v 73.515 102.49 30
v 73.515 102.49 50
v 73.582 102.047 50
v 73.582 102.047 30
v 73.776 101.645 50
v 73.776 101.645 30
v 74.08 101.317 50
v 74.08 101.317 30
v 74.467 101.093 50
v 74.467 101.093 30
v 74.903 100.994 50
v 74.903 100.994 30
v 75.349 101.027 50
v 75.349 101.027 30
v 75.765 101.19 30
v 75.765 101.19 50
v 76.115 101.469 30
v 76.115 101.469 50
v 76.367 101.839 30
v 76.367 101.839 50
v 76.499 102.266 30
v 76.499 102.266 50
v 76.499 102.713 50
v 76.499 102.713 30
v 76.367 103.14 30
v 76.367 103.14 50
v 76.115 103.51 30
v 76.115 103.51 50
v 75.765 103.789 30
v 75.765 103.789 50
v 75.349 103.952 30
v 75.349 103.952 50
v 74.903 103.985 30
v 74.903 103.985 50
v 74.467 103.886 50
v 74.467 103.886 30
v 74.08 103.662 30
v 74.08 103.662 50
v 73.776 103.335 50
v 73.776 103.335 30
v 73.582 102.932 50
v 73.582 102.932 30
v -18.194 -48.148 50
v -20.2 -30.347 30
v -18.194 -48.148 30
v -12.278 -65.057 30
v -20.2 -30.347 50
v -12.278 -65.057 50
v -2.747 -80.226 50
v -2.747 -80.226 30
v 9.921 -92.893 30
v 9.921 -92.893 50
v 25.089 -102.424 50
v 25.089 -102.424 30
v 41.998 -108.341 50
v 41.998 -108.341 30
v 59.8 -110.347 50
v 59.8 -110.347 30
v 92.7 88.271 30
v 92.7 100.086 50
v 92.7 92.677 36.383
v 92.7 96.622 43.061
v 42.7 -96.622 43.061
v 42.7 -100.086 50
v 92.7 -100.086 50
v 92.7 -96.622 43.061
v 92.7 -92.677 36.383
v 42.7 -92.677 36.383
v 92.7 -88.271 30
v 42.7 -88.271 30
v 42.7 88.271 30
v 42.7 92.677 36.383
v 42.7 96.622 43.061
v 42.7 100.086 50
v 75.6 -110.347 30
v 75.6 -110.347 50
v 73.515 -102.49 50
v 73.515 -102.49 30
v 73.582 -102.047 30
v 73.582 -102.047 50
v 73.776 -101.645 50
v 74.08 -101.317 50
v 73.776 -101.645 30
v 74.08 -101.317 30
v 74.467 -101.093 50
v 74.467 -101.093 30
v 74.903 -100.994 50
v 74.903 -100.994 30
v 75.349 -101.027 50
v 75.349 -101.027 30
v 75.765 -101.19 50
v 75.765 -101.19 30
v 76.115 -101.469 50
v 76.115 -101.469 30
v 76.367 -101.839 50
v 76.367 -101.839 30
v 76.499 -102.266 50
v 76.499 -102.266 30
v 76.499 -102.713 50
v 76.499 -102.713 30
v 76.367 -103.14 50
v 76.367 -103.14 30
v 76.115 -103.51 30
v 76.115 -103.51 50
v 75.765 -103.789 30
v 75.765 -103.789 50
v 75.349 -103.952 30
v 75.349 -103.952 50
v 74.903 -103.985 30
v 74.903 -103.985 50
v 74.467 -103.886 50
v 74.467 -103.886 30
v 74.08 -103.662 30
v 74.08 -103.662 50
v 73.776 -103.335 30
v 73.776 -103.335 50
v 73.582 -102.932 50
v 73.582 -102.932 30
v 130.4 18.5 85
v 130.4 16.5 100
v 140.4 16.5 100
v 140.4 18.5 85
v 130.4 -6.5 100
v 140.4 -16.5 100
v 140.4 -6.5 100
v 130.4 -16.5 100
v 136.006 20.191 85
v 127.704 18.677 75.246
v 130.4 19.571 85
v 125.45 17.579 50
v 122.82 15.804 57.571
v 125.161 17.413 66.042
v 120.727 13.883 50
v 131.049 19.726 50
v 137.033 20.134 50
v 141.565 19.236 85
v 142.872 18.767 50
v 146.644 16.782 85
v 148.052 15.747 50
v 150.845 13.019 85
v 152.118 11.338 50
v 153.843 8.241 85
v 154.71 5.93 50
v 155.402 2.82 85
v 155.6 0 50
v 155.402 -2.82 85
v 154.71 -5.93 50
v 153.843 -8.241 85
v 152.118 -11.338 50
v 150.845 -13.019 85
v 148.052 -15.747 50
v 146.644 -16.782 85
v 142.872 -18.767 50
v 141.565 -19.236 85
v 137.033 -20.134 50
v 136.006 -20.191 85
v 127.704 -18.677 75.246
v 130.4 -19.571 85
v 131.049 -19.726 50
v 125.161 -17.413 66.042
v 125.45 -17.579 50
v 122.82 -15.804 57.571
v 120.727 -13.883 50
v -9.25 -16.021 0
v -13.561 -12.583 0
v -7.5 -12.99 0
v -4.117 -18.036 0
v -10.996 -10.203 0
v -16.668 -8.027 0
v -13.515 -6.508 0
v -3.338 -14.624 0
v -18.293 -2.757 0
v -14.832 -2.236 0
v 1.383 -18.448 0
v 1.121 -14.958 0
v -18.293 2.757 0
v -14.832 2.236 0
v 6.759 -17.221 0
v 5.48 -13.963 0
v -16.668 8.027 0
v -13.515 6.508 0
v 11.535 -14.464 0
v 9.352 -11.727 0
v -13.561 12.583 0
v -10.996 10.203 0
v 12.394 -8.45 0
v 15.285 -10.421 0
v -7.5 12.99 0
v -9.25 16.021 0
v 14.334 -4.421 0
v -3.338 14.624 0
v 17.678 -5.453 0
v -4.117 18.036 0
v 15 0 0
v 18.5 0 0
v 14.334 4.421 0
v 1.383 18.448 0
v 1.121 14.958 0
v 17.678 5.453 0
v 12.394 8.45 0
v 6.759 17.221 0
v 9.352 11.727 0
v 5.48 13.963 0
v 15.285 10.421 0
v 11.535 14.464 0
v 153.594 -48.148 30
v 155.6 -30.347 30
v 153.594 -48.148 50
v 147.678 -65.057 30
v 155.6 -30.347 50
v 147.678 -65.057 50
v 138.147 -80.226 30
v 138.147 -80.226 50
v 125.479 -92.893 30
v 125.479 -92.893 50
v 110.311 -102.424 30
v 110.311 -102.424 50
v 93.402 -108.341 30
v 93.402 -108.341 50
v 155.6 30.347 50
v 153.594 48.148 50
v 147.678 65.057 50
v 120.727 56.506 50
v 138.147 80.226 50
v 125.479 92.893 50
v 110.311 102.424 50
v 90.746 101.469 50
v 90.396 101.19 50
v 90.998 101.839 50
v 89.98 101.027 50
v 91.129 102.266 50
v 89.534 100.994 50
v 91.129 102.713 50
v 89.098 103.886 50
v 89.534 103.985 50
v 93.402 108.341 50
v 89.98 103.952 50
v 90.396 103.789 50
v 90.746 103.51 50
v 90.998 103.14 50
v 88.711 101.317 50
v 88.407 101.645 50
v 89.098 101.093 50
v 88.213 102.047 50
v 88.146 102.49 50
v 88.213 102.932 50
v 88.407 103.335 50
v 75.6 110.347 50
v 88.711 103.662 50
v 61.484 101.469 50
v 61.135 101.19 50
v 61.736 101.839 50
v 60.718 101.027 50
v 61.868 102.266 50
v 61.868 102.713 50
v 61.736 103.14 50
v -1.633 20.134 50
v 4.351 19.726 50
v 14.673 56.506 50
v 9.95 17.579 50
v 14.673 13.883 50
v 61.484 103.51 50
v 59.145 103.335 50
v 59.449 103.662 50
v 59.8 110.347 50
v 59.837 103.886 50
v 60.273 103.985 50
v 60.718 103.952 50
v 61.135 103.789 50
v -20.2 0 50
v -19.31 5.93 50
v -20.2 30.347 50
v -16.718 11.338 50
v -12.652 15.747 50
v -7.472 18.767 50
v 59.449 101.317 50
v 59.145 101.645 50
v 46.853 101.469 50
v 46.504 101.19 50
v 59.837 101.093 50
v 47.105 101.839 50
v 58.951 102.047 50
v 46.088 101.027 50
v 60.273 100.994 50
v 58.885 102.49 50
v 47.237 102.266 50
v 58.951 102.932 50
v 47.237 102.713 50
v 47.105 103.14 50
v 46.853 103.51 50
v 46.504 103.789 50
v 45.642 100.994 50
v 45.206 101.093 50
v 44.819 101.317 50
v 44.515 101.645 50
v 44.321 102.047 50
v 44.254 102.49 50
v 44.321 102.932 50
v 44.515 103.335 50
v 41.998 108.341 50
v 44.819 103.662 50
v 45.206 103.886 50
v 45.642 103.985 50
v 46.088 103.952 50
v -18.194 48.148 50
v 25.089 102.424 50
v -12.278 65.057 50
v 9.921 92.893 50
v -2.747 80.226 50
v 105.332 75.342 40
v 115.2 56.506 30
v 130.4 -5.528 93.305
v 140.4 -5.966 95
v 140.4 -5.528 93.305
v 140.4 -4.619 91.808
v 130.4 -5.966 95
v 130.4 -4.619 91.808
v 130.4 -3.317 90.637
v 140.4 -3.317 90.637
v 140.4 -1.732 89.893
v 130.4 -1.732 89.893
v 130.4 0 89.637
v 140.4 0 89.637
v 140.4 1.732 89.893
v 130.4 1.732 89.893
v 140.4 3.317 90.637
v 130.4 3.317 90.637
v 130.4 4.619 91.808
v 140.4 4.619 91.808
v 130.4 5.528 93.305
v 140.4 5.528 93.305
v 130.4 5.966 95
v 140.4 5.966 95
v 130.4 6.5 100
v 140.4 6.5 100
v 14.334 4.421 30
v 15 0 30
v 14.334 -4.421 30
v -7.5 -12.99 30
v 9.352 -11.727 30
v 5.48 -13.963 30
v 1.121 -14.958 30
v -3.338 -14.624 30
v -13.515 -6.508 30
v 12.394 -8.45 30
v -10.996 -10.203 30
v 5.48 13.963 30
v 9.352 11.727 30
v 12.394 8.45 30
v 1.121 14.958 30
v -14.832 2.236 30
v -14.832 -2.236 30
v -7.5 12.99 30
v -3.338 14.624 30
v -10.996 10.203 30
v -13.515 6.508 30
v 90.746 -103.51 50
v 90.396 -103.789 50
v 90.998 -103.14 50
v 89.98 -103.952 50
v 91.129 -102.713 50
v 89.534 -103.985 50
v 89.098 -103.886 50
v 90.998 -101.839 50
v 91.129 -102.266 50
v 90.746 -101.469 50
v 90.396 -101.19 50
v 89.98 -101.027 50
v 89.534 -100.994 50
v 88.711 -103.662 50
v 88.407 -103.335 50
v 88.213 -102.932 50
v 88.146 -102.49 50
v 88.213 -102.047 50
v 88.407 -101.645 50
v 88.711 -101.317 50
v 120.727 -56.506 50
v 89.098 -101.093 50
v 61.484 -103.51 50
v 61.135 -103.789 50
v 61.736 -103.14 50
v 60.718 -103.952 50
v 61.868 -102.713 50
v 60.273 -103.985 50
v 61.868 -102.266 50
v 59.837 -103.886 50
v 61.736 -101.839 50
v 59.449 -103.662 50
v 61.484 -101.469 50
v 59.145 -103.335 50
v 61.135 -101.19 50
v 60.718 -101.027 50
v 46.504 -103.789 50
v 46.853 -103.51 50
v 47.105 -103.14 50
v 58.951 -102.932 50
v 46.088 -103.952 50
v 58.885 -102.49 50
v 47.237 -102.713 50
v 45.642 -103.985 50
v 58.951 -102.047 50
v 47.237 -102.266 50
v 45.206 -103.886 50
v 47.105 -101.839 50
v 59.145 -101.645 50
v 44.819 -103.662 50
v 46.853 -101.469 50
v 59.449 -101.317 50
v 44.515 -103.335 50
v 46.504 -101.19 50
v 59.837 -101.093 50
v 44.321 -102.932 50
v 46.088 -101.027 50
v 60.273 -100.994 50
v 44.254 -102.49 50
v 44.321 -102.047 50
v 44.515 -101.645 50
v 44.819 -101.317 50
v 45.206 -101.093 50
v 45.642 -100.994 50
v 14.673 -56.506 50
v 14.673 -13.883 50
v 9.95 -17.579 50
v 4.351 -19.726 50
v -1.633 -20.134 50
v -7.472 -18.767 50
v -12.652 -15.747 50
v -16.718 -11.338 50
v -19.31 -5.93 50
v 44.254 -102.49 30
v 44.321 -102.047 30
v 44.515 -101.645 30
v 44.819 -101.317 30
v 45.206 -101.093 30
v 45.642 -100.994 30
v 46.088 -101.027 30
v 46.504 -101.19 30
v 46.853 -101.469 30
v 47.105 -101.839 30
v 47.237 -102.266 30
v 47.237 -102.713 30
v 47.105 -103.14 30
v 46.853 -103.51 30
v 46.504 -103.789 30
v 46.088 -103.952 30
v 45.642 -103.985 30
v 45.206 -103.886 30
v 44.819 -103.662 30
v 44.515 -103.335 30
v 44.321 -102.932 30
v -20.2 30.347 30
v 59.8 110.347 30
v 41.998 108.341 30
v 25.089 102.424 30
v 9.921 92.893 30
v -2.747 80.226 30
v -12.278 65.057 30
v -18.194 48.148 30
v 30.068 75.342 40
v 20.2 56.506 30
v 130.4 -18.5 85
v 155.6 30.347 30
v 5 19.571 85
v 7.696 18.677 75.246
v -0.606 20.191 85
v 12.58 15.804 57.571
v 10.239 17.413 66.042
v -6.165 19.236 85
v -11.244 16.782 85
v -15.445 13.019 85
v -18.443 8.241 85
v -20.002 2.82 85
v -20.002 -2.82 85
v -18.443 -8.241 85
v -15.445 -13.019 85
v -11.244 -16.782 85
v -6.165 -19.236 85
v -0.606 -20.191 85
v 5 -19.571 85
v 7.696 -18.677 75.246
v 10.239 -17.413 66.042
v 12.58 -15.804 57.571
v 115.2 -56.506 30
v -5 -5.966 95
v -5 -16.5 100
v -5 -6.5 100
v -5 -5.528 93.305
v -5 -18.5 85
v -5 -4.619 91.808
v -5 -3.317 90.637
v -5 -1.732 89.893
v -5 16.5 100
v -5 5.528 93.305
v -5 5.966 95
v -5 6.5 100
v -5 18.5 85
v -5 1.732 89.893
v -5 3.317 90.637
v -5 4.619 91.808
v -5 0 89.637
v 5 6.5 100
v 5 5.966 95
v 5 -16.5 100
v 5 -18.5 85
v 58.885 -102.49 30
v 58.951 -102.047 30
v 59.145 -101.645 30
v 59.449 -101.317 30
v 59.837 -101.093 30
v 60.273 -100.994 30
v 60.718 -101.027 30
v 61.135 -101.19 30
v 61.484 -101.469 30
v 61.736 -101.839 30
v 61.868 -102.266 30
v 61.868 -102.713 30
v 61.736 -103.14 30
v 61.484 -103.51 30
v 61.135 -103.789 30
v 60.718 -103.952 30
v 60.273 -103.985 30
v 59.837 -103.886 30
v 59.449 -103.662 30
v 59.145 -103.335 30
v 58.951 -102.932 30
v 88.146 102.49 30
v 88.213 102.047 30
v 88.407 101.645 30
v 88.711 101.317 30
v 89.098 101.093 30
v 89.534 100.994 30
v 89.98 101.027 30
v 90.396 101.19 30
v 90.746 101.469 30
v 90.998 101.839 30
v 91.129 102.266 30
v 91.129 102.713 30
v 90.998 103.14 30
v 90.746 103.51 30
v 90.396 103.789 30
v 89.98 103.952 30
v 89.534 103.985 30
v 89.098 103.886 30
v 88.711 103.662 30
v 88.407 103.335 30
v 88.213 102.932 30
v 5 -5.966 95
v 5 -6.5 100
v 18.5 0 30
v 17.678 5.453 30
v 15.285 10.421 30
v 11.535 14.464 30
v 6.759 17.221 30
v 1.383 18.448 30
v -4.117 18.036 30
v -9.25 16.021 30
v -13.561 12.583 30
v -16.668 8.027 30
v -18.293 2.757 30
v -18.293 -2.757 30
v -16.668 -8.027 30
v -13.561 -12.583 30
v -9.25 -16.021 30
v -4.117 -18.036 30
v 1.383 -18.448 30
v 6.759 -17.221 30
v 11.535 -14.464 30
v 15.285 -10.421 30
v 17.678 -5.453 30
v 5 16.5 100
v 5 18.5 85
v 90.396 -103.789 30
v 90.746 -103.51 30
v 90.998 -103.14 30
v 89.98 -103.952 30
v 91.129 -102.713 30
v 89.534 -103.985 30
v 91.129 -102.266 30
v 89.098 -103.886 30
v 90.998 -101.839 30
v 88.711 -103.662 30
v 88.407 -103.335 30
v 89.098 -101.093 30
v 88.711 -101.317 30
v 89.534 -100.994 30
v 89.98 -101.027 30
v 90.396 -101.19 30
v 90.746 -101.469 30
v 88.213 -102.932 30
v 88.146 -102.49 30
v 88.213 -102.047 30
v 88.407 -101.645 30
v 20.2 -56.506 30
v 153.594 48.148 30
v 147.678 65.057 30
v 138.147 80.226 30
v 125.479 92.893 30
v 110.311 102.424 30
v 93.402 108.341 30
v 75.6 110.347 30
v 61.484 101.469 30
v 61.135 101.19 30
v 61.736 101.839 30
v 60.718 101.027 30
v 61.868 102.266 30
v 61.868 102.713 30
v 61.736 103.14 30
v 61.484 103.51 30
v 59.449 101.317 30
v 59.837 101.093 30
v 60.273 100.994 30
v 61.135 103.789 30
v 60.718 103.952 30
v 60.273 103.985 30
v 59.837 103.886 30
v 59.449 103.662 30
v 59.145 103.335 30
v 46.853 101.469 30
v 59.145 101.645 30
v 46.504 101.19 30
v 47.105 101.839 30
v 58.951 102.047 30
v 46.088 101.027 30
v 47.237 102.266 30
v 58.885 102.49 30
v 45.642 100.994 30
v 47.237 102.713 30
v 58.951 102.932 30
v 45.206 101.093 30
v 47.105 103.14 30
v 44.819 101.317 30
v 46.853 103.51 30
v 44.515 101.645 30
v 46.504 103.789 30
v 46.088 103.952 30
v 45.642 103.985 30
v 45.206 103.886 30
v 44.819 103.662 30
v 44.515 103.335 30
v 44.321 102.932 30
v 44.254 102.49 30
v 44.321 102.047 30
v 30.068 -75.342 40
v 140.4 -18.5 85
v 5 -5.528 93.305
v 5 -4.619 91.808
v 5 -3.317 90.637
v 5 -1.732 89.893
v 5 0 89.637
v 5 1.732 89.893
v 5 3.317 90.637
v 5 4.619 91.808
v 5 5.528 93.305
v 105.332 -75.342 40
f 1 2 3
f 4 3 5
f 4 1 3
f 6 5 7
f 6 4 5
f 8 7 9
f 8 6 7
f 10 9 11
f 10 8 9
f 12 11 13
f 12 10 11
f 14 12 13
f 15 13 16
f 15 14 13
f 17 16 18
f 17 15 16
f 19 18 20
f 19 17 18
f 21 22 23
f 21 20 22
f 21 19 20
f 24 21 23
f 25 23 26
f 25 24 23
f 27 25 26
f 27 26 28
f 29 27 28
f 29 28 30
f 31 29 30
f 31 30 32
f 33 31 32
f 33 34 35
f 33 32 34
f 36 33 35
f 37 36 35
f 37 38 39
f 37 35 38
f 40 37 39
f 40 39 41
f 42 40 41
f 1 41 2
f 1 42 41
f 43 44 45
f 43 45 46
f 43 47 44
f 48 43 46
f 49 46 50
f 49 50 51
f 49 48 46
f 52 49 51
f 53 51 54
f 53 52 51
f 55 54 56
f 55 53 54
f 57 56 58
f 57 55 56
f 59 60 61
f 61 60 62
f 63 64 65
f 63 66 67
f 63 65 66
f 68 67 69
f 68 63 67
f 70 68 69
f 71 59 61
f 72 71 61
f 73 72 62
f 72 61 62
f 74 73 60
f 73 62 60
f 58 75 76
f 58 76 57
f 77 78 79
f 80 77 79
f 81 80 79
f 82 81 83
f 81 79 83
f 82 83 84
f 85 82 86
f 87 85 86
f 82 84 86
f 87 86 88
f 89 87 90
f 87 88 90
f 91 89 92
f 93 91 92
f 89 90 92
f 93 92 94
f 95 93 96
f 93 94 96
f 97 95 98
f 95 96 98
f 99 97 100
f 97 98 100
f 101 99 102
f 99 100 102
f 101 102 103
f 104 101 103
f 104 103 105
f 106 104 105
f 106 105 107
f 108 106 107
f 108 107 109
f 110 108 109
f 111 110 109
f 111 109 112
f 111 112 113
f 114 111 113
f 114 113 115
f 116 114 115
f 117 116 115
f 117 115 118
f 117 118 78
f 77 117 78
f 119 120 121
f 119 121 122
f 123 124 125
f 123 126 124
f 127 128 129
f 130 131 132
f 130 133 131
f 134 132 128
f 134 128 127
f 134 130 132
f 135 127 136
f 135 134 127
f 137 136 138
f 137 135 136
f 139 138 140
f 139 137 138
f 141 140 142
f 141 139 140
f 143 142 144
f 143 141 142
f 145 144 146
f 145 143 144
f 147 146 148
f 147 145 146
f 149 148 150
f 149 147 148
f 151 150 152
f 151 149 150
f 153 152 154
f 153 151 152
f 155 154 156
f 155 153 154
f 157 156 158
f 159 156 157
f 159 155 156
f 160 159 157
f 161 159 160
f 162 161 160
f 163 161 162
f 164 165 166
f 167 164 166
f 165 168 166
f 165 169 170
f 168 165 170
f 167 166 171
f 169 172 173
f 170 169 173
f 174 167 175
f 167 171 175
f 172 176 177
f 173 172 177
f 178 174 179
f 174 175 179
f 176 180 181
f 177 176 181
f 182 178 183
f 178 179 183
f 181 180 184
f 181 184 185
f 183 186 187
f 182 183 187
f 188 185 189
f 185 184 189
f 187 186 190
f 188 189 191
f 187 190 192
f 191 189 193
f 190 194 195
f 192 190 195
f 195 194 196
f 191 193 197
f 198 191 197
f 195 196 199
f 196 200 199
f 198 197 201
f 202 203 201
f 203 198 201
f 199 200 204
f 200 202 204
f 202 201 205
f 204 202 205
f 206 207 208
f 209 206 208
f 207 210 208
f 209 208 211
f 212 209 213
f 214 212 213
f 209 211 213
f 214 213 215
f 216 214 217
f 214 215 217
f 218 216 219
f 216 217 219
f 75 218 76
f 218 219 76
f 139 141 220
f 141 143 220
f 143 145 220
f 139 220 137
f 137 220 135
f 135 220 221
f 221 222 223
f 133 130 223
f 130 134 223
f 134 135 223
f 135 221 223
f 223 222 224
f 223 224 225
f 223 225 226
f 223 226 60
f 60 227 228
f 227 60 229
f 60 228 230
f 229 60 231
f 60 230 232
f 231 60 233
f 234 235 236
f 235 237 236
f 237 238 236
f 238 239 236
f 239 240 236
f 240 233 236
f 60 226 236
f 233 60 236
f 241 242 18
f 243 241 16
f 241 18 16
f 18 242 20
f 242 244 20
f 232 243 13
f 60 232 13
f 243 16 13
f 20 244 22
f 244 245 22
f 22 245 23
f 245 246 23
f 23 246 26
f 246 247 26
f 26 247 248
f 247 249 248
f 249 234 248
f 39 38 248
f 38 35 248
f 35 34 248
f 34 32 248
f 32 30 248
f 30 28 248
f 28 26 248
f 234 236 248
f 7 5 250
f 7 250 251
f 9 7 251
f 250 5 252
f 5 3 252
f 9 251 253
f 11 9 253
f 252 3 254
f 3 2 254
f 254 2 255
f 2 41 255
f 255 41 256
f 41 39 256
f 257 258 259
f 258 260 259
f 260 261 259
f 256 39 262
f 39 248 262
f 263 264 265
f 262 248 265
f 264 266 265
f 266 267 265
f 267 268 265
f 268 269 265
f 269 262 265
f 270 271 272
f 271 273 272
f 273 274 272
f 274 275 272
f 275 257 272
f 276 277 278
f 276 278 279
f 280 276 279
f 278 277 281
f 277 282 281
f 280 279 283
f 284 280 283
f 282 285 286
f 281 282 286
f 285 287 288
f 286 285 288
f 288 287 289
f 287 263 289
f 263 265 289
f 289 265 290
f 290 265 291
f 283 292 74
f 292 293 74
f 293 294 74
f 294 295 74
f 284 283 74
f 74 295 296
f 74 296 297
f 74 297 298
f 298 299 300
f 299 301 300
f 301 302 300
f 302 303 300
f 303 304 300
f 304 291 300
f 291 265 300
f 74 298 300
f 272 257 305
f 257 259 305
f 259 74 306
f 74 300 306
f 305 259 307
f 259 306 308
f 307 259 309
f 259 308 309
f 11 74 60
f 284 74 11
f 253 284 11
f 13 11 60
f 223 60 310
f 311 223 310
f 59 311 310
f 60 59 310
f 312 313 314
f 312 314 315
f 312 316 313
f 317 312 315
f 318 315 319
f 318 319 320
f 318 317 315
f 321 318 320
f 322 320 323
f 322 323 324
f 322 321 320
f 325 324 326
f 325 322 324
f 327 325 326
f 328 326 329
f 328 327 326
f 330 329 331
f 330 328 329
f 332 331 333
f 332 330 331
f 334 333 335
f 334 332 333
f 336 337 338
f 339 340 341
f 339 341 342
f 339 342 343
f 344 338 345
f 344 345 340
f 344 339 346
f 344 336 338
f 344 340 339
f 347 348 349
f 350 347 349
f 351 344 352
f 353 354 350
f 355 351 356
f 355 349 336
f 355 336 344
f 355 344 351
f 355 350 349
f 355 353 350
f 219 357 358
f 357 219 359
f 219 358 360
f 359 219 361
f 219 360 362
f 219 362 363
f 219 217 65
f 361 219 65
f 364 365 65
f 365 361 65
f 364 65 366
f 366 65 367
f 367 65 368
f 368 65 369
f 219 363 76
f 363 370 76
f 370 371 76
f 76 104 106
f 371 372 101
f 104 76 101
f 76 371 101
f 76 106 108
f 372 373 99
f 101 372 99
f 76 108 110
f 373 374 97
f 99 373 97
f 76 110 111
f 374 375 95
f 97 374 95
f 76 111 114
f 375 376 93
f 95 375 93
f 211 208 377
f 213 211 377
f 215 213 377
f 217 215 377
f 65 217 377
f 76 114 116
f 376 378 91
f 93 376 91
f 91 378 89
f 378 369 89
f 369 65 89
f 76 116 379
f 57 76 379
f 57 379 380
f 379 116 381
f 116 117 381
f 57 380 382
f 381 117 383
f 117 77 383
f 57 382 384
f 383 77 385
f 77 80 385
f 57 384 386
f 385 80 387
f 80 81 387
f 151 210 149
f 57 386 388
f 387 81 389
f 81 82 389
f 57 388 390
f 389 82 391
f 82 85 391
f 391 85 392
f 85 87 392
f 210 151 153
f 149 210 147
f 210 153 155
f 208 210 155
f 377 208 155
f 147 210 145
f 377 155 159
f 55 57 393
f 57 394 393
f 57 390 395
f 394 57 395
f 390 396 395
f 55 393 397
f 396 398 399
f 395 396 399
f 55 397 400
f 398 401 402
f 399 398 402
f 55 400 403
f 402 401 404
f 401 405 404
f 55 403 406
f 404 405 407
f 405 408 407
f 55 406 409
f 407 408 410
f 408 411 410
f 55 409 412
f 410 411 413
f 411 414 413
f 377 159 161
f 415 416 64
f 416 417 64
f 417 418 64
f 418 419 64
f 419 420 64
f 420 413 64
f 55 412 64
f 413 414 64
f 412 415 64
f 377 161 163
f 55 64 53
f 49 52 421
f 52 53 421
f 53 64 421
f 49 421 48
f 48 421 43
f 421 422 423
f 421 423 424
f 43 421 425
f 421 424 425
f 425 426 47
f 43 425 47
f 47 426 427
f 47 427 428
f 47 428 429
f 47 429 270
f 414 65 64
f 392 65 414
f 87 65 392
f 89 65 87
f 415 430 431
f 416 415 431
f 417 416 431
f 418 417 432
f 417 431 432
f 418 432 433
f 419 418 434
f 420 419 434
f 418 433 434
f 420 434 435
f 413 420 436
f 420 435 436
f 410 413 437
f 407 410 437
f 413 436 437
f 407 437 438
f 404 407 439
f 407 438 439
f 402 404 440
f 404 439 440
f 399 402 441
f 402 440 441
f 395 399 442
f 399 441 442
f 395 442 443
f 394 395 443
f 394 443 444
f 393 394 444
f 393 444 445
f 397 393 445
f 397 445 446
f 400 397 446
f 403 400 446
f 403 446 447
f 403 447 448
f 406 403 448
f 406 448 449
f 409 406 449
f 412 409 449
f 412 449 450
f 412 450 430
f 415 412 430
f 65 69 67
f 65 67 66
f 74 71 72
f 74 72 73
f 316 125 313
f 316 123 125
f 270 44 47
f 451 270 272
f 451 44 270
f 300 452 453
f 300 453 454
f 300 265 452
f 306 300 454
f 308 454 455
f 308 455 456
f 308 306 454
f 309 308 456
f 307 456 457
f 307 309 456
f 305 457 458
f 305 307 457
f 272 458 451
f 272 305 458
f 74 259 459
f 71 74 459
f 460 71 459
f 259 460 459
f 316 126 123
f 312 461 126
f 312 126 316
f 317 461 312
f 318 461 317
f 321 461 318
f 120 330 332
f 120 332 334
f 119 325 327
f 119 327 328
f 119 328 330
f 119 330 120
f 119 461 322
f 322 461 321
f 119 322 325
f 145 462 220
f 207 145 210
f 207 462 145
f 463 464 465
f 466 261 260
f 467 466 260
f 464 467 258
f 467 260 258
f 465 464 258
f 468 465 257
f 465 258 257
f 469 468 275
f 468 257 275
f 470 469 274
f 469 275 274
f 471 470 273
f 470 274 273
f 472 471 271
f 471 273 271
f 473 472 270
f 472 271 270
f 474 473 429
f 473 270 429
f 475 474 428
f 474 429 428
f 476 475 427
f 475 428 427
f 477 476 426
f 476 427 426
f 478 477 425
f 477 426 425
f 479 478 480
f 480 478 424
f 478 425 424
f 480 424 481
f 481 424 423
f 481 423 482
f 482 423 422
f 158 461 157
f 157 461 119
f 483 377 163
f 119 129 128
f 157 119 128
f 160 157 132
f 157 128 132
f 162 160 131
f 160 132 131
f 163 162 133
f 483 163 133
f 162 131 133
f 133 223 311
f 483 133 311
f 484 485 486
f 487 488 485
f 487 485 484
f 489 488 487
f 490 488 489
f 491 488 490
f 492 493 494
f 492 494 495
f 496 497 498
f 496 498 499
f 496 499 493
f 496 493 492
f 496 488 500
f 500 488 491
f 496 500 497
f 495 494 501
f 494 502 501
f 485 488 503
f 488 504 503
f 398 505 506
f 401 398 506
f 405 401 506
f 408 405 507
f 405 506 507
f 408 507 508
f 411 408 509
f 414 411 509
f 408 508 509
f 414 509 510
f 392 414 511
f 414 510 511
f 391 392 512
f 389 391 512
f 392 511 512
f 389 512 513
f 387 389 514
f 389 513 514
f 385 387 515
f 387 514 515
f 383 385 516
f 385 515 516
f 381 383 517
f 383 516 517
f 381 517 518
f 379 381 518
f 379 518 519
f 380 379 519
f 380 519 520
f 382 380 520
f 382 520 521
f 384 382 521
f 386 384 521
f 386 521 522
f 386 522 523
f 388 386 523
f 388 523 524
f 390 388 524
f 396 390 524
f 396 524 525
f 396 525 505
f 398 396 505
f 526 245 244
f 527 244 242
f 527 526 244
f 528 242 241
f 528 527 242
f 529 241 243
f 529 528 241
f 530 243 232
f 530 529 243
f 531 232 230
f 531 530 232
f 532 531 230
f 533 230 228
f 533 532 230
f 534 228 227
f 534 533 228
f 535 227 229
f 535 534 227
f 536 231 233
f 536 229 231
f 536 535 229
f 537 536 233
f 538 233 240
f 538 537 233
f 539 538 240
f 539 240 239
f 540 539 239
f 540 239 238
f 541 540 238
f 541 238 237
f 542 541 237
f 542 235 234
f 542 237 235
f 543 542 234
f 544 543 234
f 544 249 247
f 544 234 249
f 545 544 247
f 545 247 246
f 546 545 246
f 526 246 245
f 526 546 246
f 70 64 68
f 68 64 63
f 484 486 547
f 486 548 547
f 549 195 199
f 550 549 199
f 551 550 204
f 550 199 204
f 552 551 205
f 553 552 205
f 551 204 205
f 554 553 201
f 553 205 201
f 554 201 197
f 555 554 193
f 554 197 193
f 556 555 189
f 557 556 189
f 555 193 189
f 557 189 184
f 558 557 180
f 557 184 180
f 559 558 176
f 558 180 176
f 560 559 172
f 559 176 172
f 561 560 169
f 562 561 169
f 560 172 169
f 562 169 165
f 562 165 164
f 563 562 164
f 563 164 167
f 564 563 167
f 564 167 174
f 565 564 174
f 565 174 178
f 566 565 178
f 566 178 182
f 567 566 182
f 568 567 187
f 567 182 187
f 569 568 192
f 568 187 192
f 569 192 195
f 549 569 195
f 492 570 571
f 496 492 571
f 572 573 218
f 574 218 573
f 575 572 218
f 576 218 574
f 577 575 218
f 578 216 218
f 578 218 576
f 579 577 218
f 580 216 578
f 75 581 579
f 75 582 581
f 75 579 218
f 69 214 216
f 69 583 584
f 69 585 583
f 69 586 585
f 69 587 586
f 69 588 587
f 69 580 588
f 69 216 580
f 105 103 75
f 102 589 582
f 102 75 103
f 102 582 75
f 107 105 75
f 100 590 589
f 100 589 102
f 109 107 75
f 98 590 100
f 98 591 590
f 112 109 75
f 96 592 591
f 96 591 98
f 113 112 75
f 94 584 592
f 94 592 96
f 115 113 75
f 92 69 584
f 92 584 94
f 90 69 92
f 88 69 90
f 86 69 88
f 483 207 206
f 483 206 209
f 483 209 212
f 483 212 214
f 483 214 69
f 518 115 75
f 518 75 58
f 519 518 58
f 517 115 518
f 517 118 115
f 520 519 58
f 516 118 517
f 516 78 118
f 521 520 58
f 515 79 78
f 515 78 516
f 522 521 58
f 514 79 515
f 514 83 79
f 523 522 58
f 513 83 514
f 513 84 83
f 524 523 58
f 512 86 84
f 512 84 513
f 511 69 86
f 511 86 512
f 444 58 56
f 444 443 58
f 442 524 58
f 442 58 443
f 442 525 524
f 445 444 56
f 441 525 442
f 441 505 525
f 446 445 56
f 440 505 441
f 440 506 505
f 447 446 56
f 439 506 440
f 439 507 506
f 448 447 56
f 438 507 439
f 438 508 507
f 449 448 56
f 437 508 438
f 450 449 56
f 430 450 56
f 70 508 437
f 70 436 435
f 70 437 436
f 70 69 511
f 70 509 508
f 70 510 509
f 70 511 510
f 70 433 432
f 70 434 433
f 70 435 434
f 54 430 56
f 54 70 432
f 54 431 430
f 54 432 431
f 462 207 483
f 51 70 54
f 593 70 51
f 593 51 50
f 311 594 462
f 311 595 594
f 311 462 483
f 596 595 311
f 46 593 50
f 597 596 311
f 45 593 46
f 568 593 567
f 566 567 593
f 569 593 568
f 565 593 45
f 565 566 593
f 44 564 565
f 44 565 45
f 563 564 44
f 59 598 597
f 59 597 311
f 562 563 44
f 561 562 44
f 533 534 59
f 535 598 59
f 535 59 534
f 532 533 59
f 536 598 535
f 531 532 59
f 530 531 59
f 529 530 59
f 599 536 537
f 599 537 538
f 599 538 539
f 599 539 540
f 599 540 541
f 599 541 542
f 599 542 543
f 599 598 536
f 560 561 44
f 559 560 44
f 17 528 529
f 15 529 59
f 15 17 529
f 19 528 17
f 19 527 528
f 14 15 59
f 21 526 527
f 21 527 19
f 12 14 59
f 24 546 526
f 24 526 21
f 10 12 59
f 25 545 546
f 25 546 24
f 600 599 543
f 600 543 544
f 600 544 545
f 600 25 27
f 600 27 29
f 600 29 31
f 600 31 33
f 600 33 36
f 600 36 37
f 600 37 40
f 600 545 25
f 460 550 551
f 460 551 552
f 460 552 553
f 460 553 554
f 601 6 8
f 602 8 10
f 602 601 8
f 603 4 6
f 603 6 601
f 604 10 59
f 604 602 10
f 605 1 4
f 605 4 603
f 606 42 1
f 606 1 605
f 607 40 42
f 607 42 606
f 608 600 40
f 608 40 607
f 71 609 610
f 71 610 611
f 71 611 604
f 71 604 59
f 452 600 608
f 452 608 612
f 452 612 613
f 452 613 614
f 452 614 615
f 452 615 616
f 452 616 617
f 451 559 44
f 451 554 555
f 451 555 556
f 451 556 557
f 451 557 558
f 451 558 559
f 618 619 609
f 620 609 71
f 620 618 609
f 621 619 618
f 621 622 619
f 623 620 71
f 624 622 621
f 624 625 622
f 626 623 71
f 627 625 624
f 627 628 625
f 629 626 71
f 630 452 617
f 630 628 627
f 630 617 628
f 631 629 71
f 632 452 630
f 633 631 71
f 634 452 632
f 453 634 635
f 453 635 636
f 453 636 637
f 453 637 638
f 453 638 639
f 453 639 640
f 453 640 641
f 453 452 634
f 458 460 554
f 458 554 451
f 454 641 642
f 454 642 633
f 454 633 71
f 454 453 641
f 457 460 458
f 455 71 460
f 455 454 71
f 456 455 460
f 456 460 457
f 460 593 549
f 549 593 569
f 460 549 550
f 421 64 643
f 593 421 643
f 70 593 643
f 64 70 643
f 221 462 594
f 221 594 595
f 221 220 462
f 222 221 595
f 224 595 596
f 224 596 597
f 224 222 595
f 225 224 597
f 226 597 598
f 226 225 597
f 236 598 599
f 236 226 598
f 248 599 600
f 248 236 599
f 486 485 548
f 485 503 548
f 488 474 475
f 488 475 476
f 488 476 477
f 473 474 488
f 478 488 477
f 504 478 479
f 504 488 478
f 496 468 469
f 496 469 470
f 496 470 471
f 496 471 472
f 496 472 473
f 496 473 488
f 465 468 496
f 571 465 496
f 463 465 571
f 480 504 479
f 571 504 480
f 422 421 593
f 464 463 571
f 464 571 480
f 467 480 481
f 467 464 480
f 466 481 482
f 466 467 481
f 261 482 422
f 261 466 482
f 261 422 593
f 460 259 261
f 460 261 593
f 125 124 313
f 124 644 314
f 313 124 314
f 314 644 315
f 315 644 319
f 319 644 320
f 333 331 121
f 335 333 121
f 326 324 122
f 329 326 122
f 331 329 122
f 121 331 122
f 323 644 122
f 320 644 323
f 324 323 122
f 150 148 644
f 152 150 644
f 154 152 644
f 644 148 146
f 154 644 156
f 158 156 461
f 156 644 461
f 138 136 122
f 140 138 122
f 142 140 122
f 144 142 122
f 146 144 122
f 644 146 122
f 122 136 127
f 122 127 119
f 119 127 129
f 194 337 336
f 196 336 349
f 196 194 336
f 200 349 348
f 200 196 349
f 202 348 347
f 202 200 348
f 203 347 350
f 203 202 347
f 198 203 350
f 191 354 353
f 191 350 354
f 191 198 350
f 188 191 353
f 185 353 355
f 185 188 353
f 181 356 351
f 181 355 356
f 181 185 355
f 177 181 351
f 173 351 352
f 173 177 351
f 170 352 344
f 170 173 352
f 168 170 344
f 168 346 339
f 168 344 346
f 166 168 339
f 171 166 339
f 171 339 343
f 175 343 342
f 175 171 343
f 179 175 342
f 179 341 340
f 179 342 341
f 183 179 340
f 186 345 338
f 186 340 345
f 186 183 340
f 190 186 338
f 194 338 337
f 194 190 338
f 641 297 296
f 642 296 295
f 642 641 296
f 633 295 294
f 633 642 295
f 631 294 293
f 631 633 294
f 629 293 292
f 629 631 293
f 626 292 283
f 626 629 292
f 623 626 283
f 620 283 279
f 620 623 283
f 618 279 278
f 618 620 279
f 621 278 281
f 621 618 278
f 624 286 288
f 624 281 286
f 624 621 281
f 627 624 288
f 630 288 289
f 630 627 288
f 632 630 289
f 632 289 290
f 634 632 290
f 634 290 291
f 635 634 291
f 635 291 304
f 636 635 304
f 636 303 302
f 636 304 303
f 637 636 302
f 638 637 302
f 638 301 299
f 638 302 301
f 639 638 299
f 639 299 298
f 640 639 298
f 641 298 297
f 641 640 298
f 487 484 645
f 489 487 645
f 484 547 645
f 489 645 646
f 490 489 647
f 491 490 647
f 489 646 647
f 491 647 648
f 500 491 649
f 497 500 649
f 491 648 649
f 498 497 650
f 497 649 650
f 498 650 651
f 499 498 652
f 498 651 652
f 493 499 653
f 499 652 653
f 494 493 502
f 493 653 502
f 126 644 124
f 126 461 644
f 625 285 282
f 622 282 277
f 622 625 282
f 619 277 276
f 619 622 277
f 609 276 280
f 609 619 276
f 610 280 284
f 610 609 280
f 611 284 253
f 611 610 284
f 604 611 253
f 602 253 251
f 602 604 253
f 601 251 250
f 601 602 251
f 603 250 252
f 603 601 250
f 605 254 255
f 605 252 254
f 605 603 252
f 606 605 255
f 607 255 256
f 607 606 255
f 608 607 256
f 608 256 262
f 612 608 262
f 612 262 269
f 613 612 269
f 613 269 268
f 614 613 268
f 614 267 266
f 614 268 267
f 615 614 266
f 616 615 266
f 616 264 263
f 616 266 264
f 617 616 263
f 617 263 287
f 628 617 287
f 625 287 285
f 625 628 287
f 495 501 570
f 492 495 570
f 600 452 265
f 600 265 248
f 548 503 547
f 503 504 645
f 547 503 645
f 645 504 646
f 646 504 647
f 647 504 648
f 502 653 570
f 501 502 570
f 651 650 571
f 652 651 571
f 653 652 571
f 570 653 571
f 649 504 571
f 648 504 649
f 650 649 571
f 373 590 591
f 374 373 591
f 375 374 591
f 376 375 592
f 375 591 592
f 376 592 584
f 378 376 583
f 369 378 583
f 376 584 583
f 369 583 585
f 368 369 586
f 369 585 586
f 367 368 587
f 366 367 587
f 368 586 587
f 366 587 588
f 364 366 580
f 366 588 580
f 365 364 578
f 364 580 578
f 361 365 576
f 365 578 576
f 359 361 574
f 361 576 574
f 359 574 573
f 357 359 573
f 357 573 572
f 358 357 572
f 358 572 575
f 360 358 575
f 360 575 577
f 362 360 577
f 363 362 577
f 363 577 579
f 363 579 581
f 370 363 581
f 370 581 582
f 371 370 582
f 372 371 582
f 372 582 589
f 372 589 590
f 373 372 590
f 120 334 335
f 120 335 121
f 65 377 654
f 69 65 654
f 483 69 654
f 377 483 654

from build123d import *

# Parameters (mm, degrees)
SKETCH_1_R                      = 18.5
SKETCH_1_R_2                    = 15
EXTRUDE_1_DEPTH                 = 30
SKETCH_2_R                      = 20.2
SKETCH_2_R_2                    = 15
EXTRUDE_2_DEPTH                 = 5
SKETCH_3_R                      = 20.2
EXTRUDE_3_DEPTH                 = 50
EXTRUDE_4_DEPTH                 = 5
EXTRUDE_5_DEPTH                 = 20
FILLET_1_R                      = 80
CUT_EXTRUDE_2_REACH             = 174.924
SKETCH_7_R                      = 110
CUT_EXTRUDE_2_DIRECTION_2_REACH = 174.924
SKETCH_11_R                     = 1.5
CUT_EXTRUDE_3_DEPTH             = 25
SKETCH_12_W                     = 57.061720969
SKETCH_12_H                     = 113.011504976
CUT_EXTRUDE_4_DEPTH             = 20


with BuildPart() as part:
    # 草图1 → 凸台-拉伸1 (new body)
    with BuildSketch(Plane.XY):
        Circle(SKETCH_1_R)
        Circle(SKETCH_1_R_2, mode=Mode.SUBTRACT)
    extrude(amount=EXTRUDE_1_DEPTH)

    # 草图2 → 凸台-拉伸2 (add)
    with BuildSketch(Plane.XY.offset(30)):
        Circle(SKETCH_2_R)
        Circle(SKETCH_2_R_2, mode=Mode.SUBTRACT)
    extrude_2 = extrude(amount=EXTRUDE_2_DEPTH)

    # 草图3 → 凸台-拉伸3 (add)
    with BuildSketch(Plane.XY.offset(35)):
        Circle(SKETCH_3_R)
    extrude_3 = extrude(amount=EXTRUDE_3_DEPTH)

    # 草图5 → 凸台-拉伸4 (add, symmetric)
    with BuildSketch(Plane(origin=(0, 0, 0), x_dir=(0, -1, 0), z_dir=(1, 0, 0))):
        with BuildLine():
            Line((-18.5, -85), (18.5, -85))
            Line((18.5, -85), (16.5, -100))
            Line((16.5, -100), (6.5, -100))
            Line((6.5, -100), (5.966081527, -95))
            ThreePointArc((5.966081527, -95), (0, -89.637080228), (-5.966081527, -95))
            Line((-5.966081527, -95), (-6.5, -100))
            Line((-6.5, -100), (-16.5, -100))
            Line((-16.5, -100), (-18.5, -85))
        make_face()
    extrude_4 = extrude(amount=EXTRUDE_4_DEPTH, both=True)

    # 草图6 → 凸台-拉伸5 (add)
    with BuildSketch(Plane(origin=(0, 0, 30), x_dir=(-1, 0, 0), z_dir=(0, 0, -1))):
        Polygon((20.2, 0), (20.2, 110.346509277), (-155.6, 110.346509277), (-155.6, 0), (-155.6, -110.346509277), (20.2, -110.346509277), align=None)
        Polygon((-115.2, 56.505752488), (-92.7, 56.505752488), (-92.7, 85), (-42.7, 85), (-42.7, 56.505752488), (-20.2, 56.505752488), (-20.2, -56.505752488), (-42.7, -56.505752488), (-42.7, -85), (-92.7, -85), (-92.7, -56.505752488), (-115.2, -56.505752488), align=None, mode=Mode.SUBTRACT)
    extrude(amount=-EXTRUDE_5_DEPTH)

    # 镜向1: 凸台-拉伸2, 凸台-拉伸3, 凸台-拉伸4 across plane
    add(extrude_2.mirror(Plane.ZY.offset(-67.7)))
    add(extrude_3.mirror(Plane.ZY.offset(-67.7)))
    add(extrude_4.mirror(Plane.ZY.offset(-67.7)))

    # 圆角1
    fillet_1_edges = [part.edges().sort_by_distance(p)[0] for p in [
        (-20.2, 110.346509277, 40),
        (-20.2, -110.346509277, 40),
        (155.6, -110.346509277, 40),
        (155.6, 110.346509277, 40),
    ]]
    fillet(fillet_1_edges, radius=FILLET_1_R)

    # 切除-拉伸2: up to this face of the body (flat: up to its plane)
    cut_extrude_2_end = Plane(part.part.faces().sort_by_distance((42.7, 70.752876244, 40))[0])
    # 草图7 → 切除-拉伸2 (cut, up to the picked face)
    with BuildSketch(Plane(origin=(67.7, 0, 0), x_dir=(0, 0, -1), z_dir=(1, 0, 0)), mode=Mode.PRIVATE) as cut_extrude_2_sk1:
        with Locations((-95.637080228, 0)):
            Circle(SKETCH_7_R)
    cut_extrude_2_tool1 = split(extrude(cut_extrude_2_sk1.sketch, amount=-CUT_EXTRUDE_2_REACH, mode=Mode.PRIVATE), bisect_by=cut_extrude_2_end, keep=Keep.BOTH, mode=Mode.PRIVATE)
    add(cut_extrude_2_tool1.solids().sort_by(Axis((67.7, 0, 95.63708), (-1, 0, 0)))[0], mode=Mode.SUBTRACT)

    # 切除-拉伸2 direction 2: up to this face of the body (flat: up to its plane)
    cut_extrude_2_direction_2_end = Plane(part.part.faces().sort_by_distance((92.7, 70.752876244, 40))[0])
    # 草图7 → 切除-拉伸2 direction 2 (cut, up to the picked face)
    with BuildSketch(Plane(origin=(67.7, 0, 0), x_dir=(0, 0, -1), z_dir=(1, 0, 0)), mode=Mode.PRIVATE) as cut_extrude_2_direction_2_sk1:
        with Locations((-95.637080228, 0)):
            Circle(SKETCH_7_R)
    cut_extrude_2_direction_2_tool1 = split(extrude(cut_extrude_2_direction_2_sk1.sketch, amount=CUT_EXTRUDE_2_DIRECTION_2_REACH, mode=Mode.PRIVATE), bisect_by=cut_extrude_2_direction_2_end, keep=Keep.BOTH, mode=Mode.PRIVATE)
    add(cut_extrude_2_direction_2_tool1.solids().sort_by(Axis((67.7, 0, 95.63708), (1, 0, 0)))[0], mode=Mode.SUBTRACT)

    # 草图11 → 切除-拉伸3 (cut)
    with BuildSketch(Plane(origin=(0, 0, 30), x_dir=(-1, 0, 0), z_dir=(0, 0, -1))):
        with Locations((-89.646136586, -102.489523561)):
            Circle(SKETCH_11_R)
        with Locations((-75.015378862, -102.489523561)):
            Circle(SKETCH_11_R)
        with Locations((-60.384621138, -102.489523561)):
            Circle(SKETCH_11_R)
        with Locations((-45.753863414, -102.489523561)):
            Circle(SKETCH_11_R)
    cut_extrude_3 = extrude(amount=-CUT_EXTRUDE_3_DEPTH, mode=Mode.SUBTRACT)

    # 镜向2: 切除-拉伸3 across plane
    add(cut_extrude_3.mirror(Plane.ZX), mode=Mode.SUBTRACT)

    # 草图12 → 切除-拉伸4 (cut)
    with BuildSketch(Plane(origin=(26.469269419, 0, 7.315143549), x_dir=(0.26637822592359434, 0, -0.9638685806445808), z_dir=(0.9638685806445808, 0, 0.26637822592359434))):
        with Locations((-52.066077741, 0)):
            Rectangle(SKETCH_12_W, SKETCH_12_H)
    cut_extrude_4 = extrude(amount=CUT_EXTRUDE_4_DEPTH, mode=Mode.SUBTRACT)

    # 镜向3: 切除-拉伸4 across plane
    add(cut_extrude_4.mirror(Plane.ZY.offset(-67.7)), mode=Mode.SUBTRACT)

    # 草图14 → 切除-放样1 section 0
    with BuildSketch(Plane.XY.offset(50)):
        with BuildLine():
            Line((14.672727273, 56.505752488), (42.7, 100.086247348))
            Line((42.7, 100.086247348), (92.7, 100.086247348))
            Line((92.7, 100.086247348), (120.727272727, 56.505752488))
            Line((120.727272727, 56.505752488), (120.727272727, -56.505752488))
            Line((120.727272727, -56.505752488), (92.7, -100.086247348))
            Line((92.7, -100.086247348), (42.7, -100.086247348))
            Line((42.7, -100.086247348), (14.672727273, -56.505752488))
            Line((14.672727273, -56.505752488), (14.672727273, 56.505752488))
        make_face()
    # 草图15 → 切除-放样1 section 1
    with BuildSketch(Plane(origin=(0, 0, 30), x_dir=(-1, 0, 0), z_dir=(0, 0, -1))):
        with BuildLine():
            Line((-92.7, 88.27102412), (-115.2, 56.505752488))
            Line((-115.2, 56.505752488), (-115.2, -56.505752488))
            Line((-115.2, -56.505752488), (-92.7, -88.27102412))
            Line((-92.7, -88.27102412), (-42.7, -88.27102412))
            Line((-42.7, -88.27102412), (-20.2, -56.505752488))
            Line((-20.2, -56.505752488), (-20.2, 56.505752488))
            Line((-20.2, 56.505752488), (-42.7, 88.27102412))
            Line((-42.7, 88.27102412), (-92.7, 88.27102412))
        make_face()
    loft(mode=Mode.SUBTRACT)


solid = part.part
